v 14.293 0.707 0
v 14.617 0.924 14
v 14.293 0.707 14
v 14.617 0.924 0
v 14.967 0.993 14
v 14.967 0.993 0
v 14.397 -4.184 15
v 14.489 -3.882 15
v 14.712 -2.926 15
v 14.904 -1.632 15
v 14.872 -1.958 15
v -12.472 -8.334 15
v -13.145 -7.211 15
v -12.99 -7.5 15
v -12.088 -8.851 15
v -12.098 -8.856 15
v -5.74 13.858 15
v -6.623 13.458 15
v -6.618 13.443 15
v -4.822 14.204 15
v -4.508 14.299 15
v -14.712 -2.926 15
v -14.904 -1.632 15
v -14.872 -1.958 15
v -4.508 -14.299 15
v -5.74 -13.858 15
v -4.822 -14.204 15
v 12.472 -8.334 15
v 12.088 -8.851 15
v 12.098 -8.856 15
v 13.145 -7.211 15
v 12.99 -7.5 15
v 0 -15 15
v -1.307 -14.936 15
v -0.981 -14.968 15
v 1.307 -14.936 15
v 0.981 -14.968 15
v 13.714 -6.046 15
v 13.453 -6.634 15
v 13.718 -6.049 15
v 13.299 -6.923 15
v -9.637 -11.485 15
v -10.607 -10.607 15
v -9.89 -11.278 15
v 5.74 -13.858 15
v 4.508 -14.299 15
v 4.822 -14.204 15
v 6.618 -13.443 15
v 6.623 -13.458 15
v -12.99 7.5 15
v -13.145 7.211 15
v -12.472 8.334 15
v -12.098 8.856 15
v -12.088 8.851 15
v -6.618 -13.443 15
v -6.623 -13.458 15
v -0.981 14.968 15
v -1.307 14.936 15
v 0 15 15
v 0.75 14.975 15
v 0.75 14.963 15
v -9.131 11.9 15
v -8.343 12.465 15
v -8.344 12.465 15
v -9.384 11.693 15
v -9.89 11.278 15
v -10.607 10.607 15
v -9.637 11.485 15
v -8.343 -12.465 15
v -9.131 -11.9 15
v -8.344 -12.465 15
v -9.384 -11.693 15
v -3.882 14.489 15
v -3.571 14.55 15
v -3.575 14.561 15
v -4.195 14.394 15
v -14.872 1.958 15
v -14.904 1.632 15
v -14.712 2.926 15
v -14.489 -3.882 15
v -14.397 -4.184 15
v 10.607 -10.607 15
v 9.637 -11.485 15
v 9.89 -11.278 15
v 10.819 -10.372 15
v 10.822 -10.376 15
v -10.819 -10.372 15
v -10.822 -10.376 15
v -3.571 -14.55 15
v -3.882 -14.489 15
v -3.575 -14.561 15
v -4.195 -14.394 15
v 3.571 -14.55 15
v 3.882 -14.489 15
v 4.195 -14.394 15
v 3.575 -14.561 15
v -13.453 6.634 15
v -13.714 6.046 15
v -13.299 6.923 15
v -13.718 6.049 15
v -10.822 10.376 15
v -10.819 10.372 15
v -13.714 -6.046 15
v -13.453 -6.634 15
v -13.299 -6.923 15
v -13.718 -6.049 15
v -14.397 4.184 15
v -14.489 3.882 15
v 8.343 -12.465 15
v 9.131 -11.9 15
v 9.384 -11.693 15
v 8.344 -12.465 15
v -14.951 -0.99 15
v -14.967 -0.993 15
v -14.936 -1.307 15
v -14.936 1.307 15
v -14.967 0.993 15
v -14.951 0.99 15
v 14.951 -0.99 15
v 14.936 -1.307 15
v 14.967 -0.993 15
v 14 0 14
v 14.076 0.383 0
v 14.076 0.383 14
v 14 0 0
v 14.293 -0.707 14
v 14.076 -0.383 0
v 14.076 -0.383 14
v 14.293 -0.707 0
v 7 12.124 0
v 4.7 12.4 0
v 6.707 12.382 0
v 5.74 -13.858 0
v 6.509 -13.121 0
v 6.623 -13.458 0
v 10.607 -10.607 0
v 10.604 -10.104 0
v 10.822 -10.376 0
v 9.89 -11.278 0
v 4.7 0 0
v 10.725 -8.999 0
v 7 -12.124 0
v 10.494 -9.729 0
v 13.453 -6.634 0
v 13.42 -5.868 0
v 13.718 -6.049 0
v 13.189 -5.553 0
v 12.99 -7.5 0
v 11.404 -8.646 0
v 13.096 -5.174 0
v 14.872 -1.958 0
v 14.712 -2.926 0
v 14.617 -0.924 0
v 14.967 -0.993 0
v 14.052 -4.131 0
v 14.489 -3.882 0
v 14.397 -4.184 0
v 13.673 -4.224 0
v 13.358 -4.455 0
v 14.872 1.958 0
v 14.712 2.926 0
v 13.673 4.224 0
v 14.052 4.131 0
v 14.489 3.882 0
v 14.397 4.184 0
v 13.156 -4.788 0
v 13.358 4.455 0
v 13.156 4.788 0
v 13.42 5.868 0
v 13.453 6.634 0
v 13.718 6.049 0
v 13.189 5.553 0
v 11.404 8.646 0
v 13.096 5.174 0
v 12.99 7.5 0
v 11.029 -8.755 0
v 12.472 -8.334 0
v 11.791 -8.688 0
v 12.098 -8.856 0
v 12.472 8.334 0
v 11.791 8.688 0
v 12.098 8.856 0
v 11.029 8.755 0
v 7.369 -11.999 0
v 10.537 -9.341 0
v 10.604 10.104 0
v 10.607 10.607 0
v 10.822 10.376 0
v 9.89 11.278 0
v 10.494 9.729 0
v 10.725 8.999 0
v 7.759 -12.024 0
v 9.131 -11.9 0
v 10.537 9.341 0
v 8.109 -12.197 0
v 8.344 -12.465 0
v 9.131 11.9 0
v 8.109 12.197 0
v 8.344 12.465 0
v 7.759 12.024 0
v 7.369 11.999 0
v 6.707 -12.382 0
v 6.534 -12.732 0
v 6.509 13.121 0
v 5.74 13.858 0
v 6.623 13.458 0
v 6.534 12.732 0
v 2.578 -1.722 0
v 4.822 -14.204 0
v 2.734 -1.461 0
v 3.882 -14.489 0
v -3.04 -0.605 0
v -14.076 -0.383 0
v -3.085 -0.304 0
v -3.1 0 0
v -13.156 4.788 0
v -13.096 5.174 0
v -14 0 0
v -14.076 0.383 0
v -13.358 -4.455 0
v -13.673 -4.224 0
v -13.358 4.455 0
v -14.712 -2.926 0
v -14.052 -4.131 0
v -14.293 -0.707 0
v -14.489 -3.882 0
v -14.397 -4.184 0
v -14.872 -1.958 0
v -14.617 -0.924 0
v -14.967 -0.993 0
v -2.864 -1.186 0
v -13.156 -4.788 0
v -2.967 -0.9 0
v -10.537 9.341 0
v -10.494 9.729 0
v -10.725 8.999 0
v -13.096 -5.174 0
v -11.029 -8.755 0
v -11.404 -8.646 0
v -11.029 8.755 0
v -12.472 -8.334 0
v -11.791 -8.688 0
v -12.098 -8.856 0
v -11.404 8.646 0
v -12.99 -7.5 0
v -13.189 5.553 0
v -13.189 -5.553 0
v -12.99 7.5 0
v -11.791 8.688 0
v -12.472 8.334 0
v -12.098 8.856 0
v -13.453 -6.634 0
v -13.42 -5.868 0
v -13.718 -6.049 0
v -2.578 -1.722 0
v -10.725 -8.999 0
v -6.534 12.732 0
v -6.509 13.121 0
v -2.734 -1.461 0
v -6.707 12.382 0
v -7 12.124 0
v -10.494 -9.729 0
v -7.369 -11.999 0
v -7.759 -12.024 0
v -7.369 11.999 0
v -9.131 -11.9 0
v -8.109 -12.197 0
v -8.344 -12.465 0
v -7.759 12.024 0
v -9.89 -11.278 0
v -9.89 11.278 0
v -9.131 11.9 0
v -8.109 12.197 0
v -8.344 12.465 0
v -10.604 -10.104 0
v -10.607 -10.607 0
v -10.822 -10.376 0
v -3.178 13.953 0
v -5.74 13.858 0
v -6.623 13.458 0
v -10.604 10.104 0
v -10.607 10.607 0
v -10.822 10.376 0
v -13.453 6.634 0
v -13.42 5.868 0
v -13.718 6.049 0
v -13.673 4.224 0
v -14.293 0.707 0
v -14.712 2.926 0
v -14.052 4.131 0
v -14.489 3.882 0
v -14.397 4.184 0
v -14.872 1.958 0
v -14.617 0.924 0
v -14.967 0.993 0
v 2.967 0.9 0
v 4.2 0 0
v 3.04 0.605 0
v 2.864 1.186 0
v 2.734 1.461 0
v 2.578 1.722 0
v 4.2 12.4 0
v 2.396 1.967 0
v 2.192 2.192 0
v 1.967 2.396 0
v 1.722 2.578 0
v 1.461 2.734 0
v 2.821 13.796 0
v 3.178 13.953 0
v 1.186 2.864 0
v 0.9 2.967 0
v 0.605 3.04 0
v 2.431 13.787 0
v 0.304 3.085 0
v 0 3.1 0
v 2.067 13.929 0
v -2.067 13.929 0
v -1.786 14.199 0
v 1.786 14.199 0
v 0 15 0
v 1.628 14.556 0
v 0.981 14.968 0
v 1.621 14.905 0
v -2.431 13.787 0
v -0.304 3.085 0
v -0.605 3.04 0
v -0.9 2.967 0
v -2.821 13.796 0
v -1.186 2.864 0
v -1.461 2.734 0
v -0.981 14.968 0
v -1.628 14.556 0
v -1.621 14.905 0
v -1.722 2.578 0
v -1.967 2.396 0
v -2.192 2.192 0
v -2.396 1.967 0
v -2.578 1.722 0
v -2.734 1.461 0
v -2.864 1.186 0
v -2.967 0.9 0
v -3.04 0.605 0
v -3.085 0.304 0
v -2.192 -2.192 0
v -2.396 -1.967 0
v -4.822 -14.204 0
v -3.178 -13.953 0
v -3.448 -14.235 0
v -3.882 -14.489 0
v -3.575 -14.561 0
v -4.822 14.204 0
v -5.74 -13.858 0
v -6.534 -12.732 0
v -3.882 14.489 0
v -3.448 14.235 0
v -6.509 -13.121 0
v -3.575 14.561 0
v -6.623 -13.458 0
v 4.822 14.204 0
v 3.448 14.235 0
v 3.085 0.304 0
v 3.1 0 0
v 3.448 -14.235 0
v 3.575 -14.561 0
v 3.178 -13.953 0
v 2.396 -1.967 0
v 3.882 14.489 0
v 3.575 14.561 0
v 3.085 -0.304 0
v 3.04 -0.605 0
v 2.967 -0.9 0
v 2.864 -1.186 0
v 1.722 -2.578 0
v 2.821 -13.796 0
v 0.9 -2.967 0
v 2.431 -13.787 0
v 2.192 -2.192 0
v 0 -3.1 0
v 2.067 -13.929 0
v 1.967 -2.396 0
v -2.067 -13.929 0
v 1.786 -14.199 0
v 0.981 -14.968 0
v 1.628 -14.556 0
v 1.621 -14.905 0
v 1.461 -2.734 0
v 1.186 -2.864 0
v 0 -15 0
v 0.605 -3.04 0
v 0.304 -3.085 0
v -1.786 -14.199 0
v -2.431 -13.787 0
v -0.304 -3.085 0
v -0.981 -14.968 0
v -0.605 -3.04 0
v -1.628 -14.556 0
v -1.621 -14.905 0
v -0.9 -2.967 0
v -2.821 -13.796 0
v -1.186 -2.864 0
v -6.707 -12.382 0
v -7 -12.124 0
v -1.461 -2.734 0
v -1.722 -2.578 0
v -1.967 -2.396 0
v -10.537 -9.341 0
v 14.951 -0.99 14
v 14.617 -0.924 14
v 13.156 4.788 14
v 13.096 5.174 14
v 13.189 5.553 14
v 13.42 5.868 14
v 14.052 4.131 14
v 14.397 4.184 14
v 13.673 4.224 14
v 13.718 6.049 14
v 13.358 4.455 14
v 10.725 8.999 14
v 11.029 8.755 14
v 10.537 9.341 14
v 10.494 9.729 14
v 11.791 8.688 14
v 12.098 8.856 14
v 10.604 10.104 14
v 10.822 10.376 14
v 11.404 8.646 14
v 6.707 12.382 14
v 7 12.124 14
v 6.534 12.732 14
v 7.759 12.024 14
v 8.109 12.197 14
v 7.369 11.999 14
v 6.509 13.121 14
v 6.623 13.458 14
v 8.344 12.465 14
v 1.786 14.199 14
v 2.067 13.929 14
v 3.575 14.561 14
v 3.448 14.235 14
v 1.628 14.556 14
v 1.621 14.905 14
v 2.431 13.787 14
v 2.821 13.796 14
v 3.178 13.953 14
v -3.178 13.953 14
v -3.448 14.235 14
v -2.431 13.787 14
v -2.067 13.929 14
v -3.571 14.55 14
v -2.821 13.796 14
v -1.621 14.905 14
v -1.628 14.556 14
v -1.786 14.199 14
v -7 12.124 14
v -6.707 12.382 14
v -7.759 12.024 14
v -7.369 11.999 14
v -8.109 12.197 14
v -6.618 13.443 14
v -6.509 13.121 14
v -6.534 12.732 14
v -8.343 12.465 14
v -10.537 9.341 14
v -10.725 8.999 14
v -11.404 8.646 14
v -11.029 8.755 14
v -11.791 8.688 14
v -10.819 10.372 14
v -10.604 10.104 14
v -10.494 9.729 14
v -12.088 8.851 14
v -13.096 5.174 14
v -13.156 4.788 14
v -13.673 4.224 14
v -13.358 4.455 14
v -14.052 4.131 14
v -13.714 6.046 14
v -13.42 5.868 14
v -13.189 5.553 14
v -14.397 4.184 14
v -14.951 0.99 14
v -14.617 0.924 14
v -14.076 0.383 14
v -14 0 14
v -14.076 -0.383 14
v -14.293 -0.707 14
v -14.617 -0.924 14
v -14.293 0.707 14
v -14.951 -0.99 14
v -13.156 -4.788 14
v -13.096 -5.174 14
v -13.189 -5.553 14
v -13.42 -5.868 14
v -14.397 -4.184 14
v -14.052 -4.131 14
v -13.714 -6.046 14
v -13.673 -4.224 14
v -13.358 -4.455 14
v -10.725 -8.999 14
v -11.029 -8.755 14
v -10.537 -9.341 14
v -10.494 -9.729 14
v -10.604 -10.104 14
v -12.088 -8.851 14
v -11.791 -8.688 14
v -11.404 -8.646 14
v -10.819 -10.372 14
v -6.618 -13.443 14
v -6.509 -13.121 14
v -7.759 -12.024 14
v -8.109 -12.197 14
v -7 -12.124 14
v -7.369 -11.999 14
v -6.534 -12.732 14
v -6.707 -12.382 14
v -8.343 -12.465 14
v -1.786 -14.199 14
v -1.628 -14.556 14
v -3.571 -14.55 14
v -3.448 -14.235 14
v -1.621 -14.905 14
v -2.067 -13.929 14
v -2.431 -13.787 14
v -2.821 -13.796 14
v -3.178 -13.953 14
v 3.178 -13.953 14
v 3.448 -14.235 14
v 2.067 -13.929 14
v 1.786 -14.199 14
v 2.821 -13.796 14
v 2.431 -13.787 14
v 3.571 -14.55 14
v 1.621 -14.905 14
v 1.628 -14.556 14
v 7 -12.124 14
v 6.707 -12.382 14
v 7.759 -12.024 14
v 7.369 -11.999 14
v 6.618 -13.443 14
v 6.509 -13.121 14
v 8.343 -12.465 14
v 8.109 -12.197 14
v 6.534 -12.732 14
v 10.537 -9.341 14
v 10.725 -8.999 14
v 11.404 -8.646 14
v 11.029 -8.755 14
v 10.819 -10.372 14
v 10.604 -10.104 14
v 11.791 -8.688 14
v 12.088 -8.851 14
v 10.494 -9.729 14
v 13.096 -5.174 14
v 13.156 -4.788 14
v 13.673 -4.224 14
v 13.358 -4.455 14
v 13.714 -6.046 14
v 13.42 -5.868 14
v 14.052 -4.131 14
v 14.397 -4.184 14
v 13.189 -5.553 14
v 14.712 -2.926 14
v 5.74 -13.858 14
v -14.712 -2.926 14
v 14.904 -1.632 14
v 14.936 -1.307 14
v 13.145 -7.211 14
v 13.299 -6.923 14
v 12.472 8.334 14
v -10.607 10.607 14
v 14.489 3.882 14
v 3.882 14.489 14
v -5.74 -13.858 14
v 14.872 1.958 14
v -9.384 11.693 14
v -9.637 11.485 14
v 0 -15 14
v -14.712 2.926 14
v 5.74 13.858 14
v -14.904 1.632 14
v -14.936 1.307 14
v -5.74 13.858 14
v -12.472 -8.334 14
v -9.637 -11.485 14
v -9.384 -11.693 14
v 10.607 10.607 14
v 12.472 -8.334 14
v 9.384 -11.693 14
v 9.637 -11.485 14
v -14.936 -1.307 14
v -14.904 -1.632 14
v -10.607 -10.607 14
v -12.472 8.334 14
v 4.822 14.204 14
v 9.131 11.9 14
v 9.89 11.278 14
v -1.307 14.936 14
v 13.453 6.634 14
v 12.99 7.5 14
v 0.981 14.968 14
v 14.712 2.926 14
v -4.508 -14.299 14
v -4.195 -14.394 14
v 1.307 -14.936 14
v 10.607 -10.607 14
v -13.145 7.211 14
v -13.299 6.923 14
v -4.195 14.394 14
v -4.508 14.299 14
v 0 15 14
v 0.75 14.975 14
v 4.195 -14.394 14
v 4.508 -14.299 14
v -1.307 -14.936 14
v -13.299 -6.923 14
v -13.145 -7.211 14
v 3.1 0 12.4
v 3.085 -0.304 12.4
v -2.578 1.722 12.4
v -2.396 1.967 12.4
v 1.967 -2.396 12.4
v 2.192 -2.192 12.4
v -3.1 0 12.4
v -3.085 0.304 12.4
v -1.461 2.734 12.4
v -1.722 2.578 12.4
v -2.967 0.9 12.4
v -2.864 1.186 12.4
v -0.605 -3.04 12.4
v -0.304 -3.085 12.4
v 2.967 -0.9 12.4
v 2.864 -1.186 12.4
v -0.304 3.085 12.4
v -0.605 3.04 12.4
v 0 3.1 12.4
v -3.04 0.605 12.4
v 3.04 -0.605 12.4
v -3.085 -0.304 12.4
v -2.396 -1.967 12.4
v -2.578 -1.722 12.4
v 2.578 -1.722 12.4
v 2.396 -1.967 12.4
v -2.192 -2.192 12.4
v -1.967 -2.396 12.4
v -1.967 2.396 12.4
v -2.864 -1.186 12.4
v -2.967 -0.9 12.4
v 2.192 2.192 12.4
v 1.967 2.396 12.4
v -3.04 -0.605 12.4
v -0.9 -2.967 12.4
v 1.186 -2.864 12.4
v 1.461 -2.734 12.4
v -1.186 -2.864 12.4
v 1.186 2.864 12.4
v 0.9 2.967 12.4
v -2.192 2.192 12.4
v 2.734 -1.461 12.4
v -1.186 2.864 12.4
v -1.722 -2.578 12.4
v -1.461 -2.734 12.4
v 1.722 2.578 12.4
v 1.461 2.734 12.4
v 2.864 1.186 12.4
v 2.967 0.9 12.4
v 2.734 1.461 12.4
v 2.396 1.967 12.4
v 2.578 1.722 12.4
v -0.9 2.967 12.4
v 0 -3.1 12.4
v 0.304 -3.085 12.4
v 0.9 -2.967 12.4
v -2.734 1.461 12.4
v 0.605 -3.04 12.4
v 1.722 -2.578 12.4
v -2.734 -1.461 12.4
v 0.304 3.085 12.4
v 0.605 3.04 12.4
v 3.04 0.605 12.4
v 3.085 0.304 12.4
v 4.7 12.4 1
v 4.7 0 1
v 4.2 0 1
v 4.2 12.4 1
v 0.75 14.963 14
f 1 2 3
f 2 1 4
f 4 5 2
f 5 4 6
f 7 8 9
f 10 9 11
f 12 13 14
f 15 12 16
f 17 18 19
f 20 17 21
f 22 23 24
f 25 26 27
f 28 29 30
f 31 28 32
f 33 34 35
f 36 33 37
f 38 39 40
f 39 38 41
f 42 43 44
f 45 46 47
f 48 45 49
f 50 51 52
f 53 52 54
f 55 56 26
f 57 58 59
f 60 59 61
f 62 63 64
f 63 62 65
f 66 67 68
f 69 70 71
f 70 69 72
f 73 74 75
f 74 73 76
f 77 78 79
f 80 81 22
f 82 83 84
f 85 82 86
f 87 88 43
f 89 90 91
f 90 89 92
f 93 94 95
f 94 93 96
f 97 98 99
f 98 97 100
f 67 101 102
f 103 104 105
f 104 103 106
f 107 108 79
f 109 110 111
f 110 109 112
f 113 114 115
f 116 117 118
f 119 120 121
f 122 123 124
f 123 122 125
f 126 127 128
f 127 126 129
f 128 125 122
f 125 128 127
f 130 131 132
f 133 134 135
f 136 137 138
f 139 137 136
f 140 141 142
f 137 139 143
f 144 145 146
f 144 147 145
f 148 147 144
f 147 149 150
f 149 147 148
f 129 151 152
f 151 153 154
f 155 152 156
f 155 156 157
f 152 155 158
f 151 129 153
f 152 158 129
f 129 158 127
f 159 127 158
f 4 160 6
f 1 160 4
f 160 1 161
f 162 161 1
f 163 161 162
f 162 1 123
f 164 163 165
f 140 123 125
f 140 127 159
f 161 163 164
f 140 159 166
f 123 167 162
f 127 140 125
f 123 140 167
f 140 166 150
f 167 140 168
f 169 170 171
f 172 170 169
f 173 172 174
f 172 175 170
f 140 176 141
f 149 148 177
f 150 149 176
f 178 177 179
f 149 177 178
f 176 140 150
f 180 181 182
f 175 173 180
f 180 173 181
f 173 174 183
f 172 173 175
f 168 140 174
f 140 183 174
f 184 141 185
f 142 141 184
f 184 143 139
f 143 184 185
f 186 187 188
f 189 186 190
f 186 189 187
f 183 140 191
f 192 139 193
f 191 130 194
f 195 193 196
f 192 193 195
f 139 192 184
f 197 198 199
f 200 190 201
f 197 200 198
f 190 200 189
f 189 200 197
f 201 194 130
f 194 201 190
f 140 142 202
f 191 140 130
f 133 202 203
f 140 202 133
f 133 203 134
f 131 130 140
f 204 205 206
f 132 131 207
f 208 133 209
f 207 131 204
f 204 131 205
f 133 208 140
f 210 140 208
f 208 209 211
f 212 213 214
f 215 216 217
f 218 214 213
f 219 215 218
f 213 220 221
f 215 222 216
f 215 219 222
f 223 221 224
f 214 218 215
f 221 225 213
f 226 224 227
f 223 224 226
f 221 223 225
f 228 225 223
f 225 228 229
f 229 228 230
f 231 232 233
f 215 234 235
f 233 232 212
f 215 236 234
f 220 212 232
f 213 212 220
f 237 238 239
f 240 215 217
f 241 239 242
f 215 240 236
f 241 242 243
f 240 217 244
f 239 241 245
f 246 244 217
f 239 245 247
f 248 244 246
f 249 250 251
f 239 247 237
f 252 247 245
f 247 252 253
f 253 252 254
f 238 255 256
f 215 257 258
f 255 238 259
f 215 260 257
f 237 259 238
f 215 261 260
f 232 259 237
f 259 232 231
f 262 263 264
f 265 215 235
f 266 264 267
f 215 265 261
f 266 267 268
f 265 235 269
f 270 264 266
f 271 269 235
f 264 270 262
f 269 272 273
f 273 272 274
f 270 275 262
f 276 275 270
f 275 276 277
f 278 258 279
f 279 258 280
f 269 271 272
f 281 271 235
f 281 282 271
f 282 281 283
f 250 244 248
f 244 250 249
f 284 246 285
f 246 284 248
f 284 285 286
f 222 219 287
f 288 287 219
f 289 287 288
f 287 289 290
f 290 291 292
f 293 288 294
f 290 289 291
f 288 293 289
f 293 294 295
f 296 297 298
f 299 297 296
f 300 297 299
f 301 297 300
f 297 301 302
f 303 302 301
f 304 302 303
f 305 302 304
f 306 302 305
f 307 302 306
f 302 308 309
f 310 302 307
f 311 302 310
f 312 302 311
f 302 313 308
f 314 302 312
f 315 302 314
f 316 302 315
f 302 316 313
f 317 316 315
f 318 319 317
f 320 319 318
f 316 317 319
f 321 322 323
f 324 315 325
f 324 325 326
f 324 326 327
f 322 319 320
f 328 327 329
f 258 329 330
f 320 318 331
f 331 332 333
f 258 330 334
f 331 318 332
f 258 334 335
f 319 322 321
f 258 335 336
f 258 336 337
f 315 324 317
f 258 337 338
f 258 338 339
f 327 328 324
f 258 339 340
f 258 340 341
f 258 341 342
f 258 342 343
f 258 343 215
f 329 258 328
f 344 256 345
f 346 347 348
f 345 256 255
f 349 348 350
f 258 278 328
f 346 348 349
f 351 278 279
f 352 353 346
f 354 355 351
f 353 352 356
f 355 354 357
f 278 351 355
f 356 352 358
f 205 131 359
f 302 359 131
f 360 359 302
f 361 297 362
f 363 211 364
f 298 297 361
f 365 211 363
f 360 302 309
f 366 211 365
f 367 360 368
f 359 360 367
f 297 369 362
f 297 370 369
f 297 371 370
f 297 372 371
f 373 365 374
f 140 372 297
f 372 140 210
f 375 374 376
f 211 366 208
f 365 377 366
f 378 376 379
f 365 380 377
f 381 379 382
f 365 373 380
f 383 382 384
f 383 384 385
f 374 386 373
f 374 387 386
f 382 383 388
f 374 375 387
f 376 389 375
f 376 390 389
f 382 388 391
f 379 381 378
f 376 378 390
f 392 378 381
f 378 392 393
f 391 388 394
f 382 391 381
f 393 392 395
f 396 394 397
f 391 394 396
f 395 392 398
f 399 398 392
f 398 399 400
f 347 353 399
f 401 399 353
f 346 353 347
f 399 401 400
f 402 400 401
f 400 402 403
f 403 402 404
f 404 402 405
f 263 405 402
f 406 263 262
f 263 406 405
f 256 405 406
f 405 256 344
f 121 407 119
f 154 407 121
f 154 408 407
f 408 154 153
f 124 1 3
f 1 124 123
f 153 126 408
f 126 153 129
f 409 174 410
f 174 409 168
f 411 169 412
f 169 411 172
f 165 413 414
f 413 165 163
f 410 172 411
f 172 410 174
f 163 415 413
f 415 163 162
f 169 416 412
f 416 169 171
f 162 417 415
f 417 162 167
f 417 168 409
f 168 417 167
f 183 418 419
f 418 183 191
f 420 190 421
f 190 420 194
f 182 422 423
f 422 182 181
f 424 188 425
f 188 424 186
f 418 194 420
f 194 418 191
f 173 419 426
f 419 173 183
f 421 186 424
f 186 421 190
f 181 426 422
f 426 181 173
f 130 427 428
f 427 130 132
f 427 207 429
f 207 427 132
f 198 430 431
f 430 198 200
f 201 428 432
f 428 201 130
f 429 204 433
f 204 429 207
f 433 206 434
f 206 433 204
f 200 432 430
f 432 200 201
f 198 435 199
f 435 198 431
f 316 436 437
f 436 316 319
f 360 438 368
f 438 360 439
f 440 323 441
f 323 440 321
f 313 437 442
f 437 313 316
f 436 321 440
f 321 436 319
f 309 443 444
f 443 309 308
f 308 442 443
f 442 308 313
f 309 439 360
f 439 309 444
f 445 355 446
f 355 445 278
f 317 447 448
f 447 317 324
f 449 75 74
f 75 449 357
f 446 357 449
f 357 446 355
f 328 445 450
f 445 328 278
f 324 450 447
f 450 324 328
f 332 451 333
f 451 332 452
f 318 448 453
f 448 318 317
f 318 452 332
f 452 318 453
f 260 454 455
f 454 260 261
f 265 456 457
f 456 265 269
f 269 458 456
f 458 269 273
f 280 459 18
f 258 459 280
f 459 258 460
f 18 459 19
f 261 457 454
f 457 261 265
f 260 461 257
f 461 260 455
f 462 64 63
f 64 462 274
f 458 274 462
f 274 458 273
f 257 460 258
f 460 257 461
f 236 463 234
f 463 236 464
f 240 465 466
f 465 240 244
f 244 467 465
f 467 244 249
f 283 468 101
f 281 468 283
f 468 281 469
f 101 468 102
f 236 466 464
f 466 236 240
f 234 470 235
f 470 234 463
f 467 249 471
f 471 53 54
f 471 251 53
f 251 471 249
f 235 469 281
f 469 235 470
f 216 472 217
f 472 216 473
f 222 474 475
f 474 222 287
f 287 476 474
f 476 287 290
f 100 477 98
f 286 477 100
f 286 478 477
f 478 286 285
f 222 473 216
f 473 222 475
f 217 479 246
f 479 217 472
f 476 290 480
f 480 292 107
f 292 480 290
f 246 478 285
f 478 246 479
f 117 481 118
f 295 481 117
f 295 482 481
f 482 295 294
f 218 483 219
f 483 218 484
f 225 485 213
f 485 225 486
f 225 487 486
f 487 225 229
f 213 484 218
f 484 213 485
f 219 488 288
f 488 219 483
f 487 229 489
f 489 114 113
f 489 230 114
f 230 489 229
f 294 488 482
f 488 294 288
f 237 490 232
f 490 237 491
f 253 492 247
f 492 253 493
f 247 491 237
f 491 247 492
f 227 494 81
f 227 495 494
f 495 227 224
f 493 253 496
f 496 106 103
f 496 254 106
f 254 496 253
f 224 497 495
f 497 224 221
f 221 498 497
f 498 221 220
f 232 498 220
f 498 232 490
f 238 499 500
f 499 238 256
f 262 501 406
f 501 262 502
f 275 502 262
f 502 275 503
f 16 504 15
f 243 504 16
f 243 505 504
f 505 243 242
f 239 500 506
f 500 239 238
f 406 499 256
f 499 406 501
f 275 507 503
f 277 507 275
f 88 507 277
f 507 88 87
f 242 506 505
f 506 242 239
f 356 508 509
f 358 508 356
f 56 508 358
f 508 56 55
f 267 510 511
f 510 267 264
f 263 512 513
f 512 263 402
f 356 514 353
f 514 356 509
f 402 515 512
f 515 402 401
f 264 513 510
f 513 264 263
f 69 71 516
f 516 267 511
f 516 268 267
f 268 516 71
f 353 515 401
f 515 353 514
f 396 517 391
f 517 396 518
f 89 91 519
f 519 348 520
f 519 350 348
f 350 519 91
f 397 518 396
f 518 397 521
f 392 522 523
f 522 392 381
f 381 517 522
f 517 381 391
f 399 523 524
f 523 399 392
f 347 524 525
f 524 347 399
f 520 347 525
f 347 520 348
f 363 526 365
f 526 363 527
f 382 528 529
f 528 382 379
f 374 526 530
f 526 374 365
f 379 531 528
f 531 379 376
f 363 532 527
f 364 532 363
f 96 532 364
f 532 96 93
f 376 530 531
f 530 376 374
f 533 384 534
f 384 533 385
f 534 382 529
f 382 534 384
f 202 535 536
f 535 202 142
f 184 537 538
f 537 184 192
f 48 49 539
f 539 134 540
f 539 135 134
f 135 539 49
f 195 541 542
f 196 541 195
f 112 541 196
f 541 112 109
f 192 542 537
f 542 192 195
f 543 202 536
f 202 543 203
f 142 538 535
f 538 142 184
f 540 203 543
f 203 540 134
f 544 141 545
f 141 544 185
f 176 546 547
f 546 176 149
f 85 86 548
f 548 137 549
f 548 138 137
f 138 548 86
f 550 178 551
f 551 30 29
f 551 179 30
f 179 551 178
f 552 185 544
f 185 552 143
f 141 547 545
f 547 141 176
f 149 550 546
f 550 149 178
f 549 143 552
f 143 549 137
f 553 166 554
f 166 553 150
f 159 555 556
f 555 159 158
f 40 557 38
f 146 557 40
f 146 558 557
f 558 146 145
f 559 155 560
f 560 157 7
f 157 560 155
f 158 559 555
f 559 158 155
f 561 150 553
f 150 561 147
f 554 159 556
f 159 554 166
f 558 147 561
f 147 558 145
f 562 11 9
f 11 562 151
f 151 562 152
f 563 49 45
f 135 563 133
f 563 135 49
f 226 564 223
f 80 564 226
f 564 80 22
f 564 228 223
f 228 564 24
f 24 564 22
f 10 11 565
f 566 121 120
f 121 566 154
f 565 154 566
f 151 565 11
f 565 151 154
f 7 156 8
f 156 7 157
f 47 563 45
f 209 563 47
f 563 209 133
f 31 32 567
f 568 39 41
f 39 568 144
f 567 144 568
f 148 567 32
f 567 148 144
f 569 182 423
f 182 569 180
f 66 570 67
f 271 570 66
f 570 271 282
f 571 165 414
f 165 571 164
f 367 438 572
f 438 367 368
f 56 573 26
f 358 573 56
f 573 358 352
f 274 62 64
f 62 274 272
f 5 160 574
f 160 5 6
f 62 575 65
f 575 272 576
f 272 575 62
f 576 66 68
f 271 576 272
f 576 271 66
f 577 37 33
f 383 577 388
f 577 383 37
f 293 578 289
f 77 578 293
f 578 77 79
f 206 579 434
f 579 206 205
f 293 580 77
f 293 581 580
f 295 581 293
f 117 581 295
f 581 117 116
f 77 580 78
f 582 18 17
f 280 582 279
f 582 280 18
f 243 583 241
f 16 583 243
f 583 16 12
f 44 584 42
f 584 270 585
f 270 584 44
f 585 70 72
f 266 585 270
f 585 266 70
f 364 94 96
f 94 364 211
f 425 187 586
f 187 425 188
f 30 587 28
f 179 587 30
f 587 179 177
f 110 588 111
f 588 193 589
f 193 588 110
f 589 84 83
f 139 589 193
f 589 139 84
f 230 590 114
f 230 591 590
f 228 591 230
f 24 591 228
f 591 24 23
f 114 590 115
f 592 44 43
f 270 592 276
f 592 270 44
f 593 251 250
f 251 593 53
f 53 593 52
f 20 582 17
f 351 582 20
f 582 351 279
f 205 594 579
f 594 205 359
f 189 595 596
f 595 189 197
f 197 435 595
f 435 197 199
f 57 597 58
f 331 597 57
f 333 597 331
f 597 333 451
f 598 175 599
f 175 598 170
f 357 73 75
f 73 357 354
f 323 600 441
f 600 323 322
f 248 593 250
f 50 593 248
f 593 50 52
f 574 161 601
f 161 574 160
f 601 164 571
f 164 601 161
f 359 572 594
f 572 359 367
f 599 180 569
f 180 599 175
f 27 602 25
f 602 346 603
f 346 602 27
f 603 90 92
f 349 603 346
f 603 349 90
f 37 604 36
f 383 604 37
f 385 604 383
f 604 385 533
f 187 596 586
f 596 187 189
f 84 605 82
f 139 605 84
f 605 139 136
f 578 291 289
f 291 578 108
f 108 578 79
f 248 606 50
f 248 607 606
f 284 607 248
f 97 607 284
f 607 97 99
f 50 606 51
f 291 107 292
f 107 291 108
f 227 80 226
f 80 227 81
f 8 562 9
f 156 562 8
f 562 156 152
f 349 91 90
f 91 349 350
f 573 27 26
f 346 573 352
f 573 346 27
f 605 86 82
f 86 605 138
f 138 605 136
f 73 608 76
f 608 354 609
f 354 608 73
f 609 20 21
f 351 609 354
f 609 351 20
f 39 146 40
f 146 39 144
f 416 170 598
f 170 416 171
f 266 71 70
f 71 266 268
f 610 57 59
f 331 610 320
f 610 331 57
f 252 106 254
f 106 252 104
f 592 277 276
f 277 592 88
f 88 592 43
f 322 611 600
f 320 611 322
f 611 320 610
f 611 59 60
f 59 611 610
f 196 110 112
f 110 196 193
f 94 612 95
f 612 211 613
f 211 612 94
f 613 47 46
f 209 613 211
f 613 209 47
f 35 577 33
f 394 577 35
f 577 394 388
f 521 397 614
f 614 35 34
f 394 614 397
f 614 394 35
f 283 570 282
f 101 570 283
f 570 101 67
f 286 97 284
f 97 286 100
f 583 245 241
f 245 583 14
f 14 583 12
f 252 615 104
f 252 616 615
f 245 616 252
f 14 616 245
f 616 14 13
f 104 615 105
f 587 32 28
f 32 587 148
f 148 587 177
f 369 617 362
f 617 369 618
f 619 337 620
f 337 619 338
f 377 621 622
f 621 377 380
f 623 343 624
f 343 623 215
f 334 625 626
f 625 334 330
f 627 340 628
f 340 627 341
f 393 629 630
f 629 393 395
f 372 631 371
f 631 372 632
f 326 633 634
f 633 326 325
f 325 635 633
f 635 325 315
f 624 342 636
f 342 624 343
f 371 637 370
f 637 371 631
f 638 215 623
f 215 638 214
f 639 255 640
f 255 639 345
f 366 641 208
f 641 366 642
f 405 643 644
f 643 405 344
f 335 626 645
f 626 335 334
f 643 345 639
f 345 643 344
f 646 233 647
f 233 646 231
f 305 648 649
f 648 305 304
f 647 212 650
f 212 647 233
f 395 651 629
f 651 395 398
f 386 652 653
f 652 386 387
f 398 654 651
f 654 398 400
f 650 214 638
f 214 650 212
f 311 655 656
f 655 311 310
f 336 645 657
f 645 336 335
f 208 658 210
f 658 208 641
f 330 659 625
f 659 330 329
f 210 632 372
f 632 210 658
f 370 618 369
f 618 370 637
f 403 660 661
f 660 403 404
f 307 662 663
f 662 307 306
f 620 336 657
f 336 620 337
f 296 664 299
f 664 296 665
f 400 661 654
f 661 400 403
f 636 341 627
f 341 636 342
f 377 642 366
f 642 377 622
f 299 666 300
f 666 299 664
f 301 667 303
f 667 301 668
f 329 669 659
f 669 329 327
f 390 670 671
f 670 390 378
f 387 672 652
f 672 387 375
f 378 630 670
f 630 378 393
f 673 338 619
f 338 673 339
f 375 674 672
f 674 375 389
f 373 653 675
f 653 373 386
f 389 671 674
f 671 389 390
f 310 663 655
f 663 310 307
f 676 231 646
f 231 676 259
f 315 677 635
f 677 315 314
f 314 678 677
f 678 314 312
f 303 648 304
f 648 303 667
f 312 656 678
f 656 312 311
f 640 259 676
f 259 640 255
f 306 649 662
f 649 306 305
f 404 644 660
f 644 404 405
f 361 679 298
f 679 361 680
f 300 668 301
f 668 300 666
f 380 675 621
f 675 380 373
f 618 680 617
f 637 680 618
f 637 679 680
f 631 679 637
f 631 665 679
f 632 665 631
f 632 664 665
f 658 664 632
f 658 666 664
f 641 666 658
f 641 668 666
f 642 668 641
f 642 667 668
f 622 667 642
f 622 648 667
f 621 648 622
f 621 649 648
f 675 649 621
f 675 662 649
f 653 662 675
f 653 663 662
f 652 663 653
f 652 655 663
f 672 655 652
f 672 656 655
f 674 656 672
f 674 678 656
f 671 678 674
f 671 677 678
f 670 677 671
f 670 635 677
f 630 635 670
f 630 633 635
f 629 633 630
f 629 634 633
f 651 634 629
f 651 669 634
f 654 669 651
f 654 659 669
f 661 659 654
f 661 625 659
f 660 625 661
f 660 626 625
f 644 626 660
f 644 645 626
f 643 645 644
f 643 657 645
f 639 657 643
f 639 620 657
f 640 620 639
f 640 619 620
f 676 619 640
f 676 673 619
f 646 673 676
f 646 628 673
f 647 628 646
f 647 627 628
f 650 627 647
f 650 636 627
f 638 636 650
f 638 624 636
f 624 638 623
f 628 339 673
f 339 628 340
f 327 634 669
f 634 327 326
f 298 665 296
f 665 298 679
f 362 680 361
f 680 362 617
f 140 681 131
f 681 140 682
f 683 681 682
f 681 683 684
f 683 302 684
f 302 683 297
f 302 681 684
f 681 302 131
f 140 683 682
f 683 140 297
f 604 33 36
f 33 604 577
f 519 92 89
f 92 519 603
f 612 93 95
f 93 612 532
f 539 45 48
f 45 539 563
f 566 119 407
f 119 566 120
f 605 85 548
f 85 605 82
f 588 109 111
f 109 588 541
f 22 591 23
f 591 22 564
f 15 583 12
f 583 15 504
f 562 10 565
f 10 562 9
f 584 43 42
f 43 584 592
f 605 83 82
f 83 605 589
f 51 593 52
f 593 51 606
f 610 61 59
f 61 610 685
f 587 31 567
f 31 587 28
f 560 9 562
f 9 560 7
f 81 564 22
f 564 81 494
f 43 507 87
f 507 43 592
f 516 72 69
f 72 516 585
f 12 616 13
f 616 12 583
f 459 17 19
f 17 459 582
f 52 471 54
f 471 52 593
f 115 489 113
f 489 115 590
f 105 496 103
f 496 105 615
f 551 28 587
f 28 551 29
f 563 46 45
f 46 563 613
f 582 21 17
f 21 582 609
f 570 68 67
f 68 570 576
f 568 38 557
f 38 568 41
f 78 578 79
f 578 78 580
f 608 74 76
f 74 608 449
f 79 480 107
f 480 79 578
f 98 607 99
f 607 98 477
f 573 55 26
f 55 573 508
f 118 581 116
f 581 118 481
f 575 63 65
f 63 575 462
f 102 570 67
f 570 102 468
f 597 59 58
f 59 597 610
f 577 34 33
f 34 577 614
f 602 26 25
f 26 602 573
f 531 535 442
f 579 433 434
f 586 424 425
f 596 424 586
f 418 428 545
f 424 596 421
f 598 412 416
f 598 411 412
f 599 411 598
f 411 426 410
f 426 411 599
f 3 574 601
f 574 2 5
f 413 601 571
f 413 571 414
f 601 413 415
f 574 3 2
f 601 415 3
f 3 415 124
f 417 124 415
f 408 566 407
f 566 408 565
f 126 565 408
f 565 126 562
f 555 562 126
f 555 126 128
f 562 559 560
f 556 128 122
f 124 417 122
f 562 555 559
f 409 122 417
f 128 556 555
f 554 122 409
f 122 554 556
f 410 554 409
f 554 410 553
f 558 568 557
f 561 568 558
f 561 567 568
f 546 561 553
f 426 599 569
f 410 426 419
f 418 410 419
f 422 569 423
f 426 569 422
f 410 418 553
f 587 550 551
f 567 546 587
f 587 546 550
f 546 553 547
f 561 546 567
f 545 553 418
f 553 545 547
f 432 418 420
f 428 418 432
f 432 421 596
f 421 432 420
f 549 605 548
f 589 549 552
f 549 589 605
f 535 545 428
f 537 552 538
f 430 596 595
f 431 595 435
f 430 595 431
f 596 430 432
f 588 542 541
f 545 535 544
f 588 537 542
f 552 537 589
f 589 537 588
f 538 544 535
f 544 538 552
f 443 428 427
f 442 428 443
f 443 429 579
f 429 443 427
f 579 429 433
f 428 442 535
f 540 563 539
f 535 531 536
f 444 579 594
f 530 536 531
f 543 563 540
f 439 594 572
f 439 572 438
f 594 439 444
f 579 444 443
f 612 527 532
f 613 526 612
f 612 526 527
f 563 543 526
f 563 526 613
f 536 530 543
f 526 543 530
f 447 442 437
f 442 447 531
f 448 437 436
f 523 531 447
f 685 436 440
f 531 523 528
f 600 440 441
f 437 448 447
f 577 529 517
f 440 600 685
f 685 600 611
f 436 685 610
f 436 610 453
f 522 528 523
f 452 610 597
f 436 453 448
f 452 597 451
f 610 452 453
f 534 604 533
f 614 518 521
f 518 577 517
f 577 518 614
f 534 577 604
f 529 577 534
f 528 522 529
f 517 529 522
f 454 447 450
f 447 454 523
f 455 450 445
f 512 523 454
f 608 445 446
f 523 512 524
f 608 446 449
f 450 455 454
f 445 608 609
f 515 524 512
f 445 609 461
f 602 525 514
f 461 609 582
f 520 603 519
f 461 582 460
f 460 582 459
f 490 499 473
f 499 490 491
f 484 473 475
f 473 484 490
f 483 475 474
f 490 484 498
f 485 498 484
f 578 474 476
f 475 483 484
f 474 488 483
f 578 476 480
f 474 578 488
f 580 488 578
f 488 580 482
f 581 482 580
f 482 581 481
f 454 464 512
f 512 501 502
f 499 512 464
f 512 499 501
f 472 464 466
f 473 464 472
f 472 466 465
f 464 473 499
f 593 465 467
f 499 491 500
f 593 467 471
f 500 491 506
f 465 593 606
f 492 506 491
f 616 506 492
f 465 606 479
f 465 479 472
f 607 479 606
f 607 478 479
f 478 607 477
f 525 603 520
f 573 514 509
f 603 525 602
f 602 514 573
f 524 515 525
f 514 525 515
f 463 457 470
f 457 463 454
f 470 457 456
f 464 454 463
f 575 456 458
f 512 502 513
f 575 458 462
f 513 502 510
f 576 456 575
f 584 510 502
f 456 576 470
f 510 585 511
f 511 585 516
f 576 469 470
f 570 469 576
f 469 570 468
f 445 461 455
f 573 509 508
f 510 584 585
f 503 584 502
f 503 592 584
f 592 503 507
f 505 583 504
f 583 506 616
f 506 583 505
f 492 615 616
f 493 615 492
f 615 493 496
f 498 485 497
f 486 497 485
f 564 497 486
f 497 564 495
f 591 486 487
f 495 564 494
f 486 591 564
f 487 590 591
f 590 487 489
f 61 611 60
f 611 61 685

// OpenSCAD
// Replacement knob for hotplate stirrer (D-shaft 6 mm)
// Print orientation: bottom face (with D-bore) on the bed, z = 0

$fn = 96;

// ---- Dimensions (mm) ----
knob_d      = 30;    // outer diameter of knob
knob_h      = 15;    // overall height
bore_d      = 6.2;   // D-bore diameter
bore_flat   = 4.7;   // distance from flat to opposite side of D-bore
groove_d    = 2;     // grip groove diameter (half-cylinder)
groove_n    = 18;    // number of grip grooves
pointer_w   = 1.5;   // pointer groove width
pointer_d   = 1;     // pointer groove depth
eps         = 0.5;   // overcut for clean differences

// Derived
bore_r = bore_d / 2;

difference() {
    // Main cylinder
    cylinder(d = knob_d, h = knob_h);

    // D-shaped blind bore from bottom face
    translate([0, 0, 0])
        linear_extrude(height = knob_h - bore_r + eps)
            circle(r = bore_r, $fn = 64);
    // Cut the flat side of the D
    translate([bore_flat - eps, 0, 0])
        cube([eps, knob_h - bore_r + eps, 1]);

    // Vertical grip grooves along full height, centred on outer surface
    for (i = [0 : groove_n - 1])
        rotate([0, 0, i * 360 / groove_n])
            translate([knob_d / 2, 0, 0])
                cylinder(d = groove_d, h = knob_h, $fn = 16);

    // Pointer groove on top face, from centre to outer edge
    translate([0, 0, knob_h - pointer_d])
        linear_extrude(height = pointer_d + eps)
            circle(r = knob_d / 2, $fn = 64);
    // Remove material outside the pointer width
    translate([pointer_w / 2, 0, knob_h - pointer_d])
        cube([knob_d / 2 - pointer_w / 2, knob_d / 2 + eps, pointer_d + eps]);
}
